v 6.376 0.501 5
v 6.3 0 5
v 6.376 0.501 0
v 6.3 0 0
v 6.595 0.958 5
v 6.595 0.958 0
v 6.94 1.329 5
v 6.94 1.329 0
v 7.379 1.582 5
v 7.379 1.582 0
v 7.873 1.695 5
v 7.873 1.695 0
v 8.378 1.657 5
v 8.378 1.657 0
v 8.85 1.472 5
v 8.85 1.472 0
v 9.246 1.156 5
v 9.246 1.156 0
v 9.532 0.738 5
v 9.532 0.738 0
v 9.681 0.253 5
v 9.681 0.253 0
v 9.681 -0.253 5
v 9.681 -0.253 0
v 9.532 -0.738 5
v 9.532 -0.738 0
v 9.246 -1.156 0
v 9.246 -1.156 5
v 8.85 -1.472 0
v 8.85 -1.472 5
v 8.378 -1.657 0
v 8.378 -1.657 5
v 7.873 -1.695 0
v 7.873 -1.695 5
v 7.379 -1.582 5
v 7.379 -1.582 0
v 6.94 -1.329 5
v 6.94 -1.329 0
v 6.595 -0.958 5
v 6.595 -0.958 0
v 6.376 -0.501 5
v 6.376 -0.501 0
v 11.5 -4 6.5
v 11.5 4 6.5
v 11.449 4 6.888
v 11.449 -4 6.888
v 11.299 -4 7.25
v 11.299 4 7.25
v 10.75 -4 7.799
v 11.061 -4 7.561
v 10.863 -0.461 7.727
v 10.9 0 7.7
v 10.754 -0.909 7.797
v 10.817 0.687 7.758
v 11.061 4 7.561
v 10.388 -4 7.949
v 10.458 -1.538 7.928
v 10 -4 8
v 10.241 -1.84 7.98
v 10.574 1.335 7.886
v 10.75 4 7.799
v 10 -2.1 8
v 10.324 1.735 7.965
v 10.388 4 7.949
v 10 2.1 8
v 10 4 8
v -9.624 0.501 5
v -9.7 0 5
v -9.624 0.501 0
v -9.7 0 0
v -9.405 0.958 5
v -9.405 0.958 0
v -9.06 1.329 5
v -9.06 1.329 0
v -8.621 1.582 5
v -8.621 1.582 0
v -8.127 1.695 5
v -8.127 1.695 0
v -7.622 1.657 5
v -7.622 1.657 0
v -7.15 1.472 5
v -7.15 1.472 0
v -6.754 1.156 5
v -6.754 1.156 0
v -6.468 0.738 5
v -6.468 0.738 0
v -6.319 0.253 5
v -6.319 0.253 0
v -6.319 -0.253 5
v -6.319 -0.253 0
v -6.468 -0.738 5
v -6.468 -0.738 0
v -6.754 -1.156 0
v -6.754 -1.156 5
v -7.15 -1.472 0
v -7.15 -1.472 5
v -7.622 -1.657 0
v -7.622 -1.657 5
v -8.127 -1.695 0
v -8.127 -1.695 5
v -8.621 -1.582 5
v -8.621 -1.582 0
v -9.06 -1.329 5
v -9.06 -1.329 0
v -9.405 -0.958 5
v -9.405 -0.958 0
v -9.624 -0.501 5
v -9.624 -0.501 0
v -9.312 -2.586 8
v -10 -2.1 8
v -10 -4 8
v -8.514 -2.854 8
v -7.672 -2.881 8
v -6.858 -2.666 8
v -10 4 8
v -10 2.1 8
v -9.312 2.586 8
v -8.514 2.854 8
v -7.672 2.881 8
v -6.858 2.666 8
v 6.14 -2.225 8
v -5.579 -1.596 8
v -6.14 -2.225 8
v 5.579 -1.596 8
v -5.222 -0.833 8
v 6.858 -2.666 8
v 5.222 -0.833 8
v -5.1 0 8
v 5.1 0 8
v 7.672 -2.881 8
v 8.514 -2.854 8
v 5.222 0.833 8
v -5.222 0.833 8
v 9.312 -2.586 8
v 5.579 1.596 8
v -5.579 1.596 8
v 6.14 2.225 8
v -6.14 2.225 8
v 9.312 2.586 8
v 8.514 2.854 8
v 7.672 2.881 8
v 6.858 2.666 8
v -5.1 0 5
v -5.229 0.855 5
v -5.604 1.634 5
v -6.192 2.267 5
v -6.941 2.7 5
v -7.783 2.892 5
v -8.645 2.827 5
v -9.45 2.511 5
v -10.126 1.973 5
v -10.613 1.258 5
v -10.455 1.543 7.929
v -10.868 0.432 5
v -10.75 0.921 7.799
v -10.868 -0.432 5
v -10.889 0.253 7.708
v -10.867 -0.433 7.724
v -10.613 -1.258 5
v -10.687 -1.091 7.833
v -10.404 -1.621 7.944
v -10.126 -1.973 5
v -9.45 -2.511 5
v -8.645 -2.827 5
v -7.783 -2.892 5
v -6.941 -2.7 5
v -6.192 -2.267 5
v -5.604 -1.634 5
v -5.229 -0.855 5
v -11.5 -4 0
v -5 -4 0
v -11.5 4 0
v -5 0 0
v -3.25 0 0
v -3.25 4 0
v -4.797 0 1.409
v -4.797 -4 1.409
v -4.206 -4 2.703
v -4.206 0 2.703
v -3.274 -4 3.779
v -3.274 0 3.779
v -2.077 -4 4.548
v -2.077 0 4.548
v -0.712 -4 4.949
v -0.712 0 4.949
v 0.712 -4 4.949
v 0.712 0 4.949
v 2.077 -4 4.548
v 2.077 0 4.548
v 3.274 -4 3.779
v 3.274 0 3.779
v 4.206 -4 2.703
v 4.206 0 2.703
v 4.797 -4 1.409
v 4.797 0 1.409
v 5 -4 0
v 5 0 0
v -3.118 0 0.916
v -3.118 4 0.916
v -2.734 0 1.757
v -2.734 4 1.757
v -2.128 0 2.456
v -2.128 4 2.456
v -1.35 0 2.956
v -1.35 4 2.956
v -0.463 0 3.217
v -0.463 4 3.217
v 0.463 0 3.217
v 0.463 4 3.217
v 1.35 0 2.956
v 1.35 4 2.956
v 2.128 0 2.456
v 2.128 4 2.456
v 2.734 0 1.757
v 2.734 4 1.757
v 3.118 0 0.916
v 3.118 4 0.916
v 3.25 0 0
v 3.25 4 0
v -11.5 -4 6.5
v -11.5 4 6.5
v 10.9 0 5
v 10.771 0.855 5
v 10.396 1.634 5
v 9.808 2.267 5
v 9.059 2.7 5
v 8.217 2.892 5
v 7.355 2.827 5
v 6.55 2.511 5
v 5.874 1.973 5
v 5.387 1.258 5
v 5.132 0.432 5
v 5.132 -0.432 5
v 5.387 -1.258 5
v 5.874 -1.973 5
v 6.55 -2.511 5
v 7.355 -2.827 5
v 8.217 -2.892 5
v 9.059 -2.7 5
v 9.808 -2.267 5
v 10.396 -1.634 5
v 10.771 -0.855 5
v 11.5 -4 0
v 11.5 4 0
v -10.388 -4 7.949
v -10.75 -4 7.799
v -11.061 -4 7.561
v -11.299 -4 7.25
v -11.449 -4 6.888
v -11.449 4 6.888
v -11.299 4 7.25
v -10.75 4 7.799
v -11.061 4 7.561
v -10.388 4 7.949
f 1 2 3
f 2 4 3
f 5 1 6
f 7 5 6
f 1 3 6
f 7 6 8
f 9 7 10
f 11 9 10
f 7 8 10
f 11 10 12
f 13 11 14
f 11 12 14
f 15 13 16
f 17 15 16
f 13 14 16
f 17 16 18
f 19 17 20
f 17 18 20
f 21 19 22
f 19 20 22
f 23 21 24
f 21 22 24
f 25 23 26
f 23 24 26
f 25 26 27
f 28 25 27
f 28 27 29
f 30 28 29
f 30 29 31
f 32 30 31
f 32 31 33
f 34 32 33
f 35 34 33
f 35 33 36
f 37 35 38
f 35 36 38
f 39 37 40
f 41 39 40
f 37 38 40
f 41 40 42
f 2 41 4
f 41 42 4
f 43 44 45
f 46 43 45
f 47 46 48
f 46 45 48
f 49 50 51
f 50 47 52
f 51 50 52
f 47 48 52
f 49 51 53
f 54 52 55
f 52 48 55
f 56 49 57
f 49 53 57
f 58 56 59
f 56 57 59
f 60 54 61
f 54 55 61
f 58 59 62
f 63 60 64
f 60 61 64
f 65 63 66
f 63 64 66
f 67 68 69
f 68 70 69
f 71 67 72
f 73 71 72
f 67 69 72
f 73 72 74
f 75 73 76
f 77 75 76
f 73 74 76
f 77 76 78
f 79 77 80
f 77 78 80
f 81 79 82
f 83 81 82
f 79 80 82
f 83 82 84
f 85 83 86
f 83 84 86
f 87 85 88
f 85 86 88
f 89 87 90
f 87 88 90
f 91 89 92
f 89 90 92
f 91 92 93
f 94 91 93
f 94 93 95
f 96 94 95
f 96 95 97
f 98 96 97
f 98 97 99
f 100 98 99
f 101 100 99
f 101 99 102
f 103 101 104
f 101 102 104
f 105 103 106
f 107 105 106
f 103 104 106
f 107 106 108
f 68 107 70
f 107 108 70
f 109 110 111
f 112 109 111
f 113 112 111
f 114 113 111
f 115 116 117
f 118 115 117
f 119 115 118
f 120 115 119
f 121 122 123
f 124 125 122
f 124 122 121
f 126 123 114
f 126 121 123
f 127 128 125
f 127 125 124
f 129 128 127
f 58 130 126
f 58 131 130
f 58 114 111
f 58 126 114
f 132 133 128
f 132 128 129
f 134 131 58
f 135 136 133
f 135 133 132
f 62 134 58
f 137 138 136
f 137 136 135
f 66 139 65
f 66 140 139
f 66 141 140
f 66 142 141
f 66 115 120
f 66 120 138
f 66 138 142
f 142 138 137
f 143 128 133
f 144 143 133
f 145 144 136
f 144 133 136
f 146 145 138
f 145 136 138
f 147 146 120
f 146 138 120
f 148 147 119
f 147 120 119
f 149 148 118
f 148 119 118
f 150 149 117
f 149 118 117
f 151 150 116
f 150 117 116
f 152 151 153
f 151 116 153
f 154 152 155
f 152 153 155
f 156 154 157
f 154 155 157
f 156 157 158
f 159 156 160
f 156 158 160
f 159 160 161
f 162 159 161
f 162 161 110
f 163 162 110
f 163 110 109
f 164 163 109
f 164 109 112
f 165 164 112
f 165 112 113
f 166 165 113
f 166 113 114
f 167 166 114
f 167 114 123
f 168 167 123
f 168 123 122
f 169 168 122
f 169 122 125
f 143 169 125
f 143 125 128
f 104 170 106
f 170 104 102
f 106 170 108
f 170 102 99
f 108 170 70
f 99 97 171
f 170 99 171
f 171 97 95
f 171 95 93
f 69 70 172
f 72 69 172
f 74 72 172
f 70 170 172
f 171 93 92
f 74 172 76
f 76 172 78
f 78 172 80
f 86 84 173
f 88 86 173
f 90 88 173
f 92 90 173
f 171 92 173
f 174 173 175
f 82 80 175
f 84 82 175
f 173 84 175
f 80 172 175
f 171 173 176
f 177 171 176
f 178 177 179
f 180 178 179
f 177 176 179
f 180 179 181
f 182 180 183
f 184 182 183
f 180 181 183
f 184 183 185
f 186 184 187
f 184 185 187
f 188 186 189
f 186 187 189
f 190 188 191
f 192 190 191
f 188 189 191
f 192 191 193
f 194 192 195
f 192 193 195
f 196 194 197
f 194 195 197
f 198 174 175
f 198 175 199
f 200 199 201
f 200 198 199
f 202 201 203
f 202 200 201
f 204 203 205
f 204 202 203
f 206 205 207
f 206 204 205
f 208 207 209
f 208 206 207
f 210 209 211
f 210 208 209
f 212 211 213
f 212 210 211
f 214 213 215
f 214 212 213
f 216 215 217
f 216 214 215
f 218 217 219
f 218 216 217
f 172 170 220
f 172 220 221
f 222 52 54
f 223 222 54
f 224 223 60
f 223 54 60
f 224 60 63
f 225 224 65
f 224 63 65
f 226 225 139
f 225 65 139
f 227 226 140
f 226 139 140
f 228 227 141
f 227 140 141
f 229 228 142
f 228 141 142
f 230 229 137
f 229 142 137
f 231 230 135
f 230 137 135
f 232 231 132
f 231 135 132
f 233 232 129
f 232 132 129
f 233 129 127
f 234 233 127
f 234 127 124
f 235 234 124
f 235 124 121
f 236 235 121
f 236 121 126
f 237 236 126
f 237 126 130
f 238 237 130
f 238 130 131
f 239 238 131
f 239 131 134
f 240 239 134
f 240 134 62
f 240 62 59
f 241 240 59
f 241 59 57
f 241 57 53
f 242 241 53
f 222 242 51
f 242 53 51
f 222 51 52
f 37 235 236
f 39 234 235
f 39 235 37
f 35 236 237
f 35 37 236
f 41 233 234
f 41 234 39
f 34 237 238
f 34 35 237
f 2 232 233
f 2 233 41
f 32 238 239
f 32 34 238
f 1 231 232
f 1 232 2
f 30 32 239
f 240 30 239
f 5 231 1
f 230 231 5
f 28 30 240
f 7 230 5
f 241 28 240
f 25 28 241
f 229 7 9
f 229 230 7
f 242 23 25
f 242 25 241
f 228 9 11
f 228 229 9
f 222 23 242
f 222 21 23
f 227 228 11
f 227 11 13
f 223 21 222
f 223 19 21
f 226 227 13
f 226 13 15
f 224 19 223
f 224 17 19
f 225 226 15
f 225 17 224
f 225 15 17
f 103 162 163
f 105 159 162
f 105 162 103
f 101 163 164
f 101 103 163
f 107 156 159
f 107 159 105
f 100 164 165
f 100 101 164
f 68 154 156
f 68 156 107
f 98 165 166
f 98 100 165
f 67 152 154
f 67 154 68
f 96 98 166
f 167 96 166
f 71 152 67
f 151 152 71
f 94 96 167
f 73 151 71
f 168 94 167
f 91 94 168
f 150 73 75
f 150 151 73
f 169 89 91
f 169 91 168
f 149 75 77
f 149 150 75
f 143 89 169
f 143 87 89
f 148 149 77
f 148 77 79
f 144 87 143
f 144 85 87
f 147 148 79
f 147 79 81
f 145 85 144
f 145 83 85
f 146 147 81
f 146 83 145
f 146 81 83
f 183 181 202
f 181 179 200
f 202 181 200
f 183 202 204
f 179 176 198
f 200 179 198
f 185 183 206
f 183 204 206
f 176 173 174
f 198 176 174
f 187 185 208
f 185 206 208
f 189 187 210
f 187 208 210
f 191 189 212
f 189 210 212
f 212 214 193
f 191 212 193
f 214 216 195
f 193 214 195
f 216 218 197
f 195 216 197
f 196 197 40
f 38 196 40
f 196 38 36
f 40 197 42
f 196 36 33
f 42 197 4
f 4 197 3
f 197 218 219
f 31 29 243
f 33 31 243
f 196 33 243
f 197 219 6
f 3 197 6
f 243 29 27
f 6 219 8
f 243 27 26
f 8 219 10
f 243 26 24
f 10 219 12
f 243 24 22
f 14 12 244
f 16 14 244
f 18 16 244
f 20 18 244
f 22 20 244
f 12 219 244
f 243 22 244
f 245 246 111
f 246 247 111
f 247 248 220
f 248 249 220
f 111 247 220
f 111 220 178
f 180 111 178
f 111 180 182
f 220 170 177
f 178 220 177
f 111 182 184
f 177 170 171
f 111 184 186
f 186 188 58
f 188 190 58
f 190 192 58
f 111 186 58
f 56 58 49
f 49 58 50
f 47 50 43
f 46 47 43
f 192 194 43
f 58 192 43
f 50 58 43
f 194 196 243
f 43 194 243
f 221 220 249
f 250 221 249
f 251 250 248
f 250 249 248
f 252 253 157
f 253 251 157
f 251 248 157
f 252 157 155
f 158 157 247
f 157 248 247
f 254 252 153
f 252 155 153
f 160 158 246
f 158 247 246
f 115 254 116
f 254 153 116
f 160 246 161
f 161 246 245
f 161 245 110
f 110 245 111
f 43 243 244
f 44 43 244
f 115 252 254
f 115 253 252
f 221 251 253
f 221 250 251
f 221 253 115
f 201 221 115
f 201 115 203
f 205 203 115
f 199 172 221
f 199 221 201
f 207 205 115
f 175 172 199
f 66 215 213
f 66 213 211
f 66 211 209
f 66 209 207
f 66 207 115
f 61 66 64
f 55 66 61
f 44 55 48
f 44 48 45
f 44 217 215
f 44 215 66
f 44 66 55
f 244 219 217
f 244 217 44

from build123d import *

# Parameters (mm, degrees)
SKETCH1_W                      = 23
SKETCH1_H                      = 8
BOSS_EXTRUDE1_DEPTH            = 8
SKETCH2_R                      = 5
CUT_EXTRUDE1_DEPTH             = 15.568802284
CBORE_FOR_M3_SHCS1_D           = 3.4
CBORE_FOR_M3_SHCS1_CBORE_D     = 5.8
CBORE_FOR_M3_SHCS1_CBORE_DEPTH = 3
SKETCH8_R                      = 3.25
CUT_EXTRUDE2_DEPTH             = 15.568802284
FILLET1_R                      = 1.5


with BuildPart() as part:
    # Sketch1 → Boss-Extrude1 (new body)
    with BuildSketch(Plane.XY):
        Rectangle(SKETCH1_W, SKETCH1_H)
    extrude(amount=BOSS_EXTRUDE1_DEPTH)

    # Sketch2 → Cut-Extrude1 (cut, through all)
    with BuildSketch(Plane(origin=(0, 0, 0), x_dir=(1, 0, 0), z_dir=(0, 1, 0))):
        Circle(SKETCH2_R)
    extrude(amount=-CUT_EXTRUDE1_DEPTH, mode=Mode.SUBTRACT)

    # CBORE for M3 SHCS1 (through all)
    with Locations(Plane.XY.offset(8)):
        with Locations((-8, 0), (8, 0)):
            CounterBoreHole(CBORE_FOR_M3_SHCS1_D / 2, CBORE_FOR_M3_SHCS1_CBORE_D / 2, CBORE_FOR_M3_SHCS1_CBORE_DEPTH)

    # Sketch8 → Cut-Extrude2 (cut, through all)
    with BuildSketch(Plane(origin=(0, 0, 0), x_dir=(1, 0, 0), z_dir=(0, 1, 0))):
        Circle(SKETCH8_R)
    extrude(amount=CUT_EXTRUDE2_DEPTH, mode=Mode.SUBTRACT)

    # Fillet1
    # the kernel refuses this fillet: 1.5 mm, written as the material it takes off along each edge
    with BuildSketch(Plane(origin=(-11.5, -7.75, 8), x_dir=(1, 0, 0), z_dir=(0, 1, 0))) as fillet1_piece_1:
        with BuildLine():
            CenterArc((FILLET1_R, FILLET1_R), FILLET1_R, 180, 90)
            Line((0, FILLET1_R), (0, 0))
            Line((0, 0), (FILLET1_R, 0))
        make_face()
    extrude(amount=15.5, mode=Mode.SUBTRACT)
    with BuildSketch(Plane(origin=(11.5, 7.75, 8), x_dir=(0, 0, -1), z_dir=(0, -1, 0))) as fillet1_piece_2:
        with BuildLine():
            CenterArc((FILLET1_R, -FILLET1_R), FILLET1_R, 90, 90)
            Line((0, -FILLET1_R), (0, 0))
            Line((0, 0), (FILLET1_R, 0))
        make_face()
    extrude(amount=15.5, mode=Mode.SUBTRACT)


solid = part.part
